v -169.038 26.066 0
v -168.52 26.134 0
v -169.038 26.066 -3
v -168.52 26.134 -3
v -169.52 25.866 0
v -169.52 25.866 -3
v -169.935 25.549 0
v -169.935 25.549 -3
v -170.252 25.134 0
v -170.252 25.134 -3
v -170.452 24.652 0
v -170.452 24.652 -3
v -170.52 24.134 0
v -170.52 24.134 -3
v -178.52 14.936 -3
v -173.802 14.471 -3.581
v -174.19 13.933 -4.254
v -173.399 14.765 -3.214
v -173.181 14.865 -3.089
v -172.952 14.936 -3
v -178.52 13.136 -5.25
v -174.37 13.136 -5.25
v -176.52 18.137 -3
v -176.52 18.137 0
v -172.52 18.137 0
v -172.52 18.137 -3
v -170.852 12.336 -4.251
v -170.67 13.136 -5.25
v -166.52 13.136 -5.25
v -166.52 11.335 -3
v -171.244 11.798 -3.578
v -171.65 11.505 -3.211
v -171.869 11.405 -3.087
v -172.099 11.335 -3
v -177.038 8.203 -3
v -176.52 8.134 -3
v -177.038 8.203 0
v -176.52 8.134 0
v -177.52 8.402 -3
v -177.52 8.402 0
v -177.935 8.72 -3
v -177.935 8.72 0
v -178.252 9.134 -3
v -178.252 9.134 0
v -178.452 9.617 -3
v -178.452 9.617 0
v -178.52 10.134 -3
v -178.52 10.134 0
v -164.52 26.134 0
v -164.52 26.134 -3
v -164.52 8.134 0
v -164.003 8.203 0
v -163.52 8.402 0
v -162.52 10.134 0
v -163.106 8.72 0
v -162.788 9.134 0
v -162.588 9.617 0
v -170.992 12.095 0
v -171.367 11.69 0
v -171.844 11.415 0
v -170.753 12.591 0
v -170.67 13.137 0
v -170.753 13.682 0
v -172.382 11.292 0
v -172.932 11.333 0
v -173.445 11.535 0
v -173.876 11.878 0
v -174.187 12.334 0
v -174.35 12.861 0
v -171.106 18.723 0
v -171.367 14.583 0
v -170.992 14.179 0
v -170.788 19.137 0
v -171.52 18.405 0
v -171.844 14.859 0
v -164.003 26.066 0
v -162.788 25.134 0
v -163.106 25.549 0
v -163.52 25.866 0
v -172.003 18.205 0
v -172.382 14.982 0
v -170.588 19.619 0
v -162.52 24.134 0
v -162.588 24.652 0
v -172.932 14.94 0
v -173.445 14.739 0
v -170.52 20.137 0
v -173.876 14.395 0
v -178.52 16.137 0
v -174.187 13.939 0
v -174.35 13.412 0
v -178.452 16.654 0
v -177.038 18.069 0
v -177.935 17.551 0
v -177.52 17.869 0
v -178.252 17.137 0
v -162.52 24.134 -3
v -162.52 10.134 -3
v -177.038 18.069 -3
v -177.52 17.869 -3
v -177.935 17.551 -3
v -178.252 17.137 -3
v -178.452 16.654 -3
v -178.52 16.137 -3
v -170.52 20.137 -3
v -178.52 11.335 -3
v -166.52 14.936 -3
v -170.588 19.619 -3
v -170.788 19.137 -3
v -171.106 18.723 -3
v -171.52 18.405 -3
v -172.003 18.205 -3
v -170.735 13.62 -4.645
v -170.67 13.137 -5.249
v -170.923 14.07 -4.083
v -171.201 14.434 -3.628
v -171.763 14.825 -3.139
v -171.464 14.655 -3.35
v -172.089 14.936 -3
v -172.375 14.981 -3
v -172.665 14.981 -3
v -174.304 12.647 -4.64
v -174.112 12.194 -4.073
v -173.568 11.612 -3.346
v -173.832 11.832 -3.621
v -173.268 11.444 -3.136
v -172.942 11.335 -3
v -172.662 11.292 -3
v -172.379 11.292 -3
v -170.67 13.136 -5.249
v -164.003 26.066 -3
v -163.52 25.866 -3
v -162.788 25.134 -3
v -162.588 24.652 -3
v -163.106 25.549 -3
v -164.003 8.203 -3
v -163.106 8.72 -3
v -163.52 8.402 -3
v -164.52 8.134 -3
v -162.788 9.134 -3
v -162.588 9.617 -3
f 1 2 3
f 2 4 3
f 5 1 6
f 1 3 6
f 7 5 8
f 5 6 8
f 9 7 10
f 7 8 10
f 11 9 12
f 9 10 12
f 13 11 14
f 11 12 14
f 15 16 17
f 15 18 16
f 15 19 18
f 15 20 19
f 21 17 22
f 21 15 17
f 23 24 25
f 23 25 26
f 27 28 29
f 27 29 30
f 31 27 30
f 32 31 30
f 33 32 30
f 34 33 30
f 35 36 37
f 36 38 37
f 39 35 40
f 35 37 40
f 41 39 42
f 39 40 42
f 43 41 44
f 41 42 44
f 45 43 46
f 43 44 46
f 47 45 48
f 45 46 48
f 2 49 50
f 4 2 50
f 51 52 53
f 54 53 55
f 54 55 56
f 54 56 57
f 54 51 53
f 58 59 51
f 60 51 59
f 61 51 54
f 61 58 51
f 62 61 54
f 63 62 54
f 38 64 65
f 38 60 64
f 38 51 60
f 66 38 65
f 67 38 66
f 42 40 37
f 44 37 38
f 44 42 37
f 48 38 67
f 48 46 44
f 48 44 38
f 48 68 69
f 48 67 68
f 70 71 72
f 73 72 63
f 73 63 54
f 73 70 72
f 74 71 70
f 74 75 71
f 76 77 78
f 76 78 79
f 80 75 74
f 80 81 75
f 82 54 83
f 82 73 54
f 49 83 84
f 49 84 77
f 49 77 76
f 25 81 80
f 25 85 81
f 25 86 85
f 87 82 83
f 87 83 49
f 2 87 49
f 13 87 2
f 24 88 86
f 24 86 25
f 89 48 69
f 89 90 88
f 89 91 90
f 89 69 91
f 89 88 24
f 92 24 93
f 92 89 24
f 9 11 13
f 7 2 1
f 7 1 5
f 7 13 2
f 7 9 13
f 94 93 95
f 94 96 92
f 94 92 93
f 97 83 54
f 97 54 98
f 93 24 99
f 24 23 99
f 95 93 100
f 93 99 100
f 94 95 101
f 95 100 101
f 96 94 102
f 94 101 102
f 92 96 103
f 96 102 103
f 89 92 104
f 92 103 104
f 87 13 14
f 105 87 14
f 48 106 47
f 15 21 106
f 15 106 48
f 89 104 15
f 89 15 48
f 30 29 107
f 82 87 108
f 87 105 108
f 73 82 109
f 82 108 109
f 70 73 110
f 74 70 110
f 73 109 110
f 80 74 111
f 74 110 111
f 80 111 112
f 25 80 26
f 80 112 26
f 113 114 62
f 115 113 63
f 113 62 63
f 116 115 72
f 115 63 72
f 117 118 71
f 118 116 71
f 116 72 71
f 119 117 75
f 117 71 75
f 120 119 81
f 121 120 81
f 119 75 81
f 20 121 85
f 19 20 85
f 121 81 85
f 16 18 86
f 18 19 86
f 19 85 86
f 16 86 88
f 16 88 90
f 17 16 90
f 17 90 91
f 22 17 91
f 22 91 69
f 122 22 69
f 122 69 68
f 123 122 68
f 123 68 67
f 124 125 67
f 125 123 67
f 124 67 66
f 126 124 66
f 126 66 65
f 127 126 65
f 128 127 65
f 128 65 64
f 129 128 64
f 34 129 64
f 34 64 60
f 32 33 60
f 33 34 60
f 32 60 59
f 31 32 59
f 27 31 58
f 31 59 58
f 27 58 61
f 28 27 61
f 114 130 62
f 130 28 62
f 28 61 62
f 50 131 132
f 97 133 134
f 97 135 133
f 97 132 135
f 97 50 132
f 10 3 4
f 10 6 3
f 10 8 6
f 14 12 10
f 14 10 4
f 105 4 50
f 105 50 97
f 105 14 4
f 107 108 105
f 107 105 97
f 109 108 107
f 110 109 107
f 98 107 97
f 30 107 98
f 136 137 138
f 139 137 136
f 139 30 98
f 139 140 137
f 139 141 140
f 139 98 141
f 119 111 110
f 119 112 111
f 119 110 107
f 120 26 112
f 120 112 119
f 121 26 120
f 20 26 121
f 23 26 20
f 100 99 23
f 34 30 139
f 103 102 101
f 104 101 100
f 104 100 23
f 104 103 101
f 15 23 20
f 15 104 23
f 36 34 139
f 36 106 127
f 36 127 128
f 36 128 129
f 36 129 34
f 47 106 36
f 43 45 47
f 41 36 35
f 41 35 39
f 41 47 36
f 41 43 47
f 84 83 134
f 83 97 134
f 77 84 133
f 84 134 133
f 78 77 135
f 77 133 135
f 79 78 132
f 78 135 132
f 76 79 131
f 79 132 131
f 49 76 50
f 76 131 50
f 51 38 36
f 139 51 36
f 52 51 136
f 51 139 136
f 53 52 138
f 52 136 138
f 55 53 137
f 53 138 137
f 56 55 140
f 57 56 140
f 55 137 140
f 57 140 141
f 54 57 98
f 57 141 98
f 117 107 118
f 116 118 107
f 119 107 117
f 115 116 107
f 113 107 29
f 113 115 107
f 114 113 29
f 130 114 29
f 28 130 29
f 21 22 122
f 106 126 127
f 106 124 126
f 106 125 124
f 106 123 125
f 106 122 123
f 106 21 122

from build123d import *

# Parameters (mm, degrees)
BOSS_EXTRUDE3_DEPTH = 12
SKETCH4_R           = 1.85
CUT_EXTRUDE1_DEPTH  = 12
SKETCH5_W           = 3
SKETCH5_H           = 18
BOSS_EXTRUDE4_DEPTH = 4
FILLET2_R           = 2


with BuildPart() as part:
    # Sketch3 → Boss-Extrude3 (new body)
    with BuildSketch(Plane.ZY.offset(178.52034041)):
        Polygon((-3, 14.935767061), (-5.250229512, 13.135583451), (-3, 11.335399842), (-3, 8.134419599), (0, 8.134419599), (0, 18.136747304), (-3, 18.136747304), align=None)
    extrude(amount=-BOSS_EXTRUDE3_DEPTH)

    # Sketch4 → Cut-Extrude1 (cut)
    with BuildSketch(Plane.XY):
        with Locations((-172.52034041, 13.136747304)):
            Circle(SKETCH4_R)
    extrude(amount=-CUT_EXTRUDE1_DEPTH, mode=Mode.SUBTRACT)

    # Sketch5 → Boss-Extrude4 (add, symmetric)
    with BuildSketch(Plane(origin=(-166.52034041, 0, 0), x_dir=(0, 0, -1), z_dir=(1, 0, 0))):
        with Locations((1.5, 17.134419599)):
            Rectangle(SKETCH5_W, SKETCH5_H)
    extrude(amount=BOSS_EXTRUDE4_DEPTH, both=True)

    # Fillet2
    fillet2_edges = [part.edges().sort_by_distance(p)[0] for p in [
        (-170.52034041, 18.136747304, -1.5),
        (-170.52034041, 26.134419599, -1.5),
        (-162.52034041, 8.134419599, -1.5),
        (-162.52034041, 26.134419599, -1.5),
        (-178.52034041, 18.136747304, -1.5),
        (-178.52034041, 8.134419599, -1.5),
    ]]
    fillet(fillet2_edges, radius=FILLET2_R)


solid = part.part
